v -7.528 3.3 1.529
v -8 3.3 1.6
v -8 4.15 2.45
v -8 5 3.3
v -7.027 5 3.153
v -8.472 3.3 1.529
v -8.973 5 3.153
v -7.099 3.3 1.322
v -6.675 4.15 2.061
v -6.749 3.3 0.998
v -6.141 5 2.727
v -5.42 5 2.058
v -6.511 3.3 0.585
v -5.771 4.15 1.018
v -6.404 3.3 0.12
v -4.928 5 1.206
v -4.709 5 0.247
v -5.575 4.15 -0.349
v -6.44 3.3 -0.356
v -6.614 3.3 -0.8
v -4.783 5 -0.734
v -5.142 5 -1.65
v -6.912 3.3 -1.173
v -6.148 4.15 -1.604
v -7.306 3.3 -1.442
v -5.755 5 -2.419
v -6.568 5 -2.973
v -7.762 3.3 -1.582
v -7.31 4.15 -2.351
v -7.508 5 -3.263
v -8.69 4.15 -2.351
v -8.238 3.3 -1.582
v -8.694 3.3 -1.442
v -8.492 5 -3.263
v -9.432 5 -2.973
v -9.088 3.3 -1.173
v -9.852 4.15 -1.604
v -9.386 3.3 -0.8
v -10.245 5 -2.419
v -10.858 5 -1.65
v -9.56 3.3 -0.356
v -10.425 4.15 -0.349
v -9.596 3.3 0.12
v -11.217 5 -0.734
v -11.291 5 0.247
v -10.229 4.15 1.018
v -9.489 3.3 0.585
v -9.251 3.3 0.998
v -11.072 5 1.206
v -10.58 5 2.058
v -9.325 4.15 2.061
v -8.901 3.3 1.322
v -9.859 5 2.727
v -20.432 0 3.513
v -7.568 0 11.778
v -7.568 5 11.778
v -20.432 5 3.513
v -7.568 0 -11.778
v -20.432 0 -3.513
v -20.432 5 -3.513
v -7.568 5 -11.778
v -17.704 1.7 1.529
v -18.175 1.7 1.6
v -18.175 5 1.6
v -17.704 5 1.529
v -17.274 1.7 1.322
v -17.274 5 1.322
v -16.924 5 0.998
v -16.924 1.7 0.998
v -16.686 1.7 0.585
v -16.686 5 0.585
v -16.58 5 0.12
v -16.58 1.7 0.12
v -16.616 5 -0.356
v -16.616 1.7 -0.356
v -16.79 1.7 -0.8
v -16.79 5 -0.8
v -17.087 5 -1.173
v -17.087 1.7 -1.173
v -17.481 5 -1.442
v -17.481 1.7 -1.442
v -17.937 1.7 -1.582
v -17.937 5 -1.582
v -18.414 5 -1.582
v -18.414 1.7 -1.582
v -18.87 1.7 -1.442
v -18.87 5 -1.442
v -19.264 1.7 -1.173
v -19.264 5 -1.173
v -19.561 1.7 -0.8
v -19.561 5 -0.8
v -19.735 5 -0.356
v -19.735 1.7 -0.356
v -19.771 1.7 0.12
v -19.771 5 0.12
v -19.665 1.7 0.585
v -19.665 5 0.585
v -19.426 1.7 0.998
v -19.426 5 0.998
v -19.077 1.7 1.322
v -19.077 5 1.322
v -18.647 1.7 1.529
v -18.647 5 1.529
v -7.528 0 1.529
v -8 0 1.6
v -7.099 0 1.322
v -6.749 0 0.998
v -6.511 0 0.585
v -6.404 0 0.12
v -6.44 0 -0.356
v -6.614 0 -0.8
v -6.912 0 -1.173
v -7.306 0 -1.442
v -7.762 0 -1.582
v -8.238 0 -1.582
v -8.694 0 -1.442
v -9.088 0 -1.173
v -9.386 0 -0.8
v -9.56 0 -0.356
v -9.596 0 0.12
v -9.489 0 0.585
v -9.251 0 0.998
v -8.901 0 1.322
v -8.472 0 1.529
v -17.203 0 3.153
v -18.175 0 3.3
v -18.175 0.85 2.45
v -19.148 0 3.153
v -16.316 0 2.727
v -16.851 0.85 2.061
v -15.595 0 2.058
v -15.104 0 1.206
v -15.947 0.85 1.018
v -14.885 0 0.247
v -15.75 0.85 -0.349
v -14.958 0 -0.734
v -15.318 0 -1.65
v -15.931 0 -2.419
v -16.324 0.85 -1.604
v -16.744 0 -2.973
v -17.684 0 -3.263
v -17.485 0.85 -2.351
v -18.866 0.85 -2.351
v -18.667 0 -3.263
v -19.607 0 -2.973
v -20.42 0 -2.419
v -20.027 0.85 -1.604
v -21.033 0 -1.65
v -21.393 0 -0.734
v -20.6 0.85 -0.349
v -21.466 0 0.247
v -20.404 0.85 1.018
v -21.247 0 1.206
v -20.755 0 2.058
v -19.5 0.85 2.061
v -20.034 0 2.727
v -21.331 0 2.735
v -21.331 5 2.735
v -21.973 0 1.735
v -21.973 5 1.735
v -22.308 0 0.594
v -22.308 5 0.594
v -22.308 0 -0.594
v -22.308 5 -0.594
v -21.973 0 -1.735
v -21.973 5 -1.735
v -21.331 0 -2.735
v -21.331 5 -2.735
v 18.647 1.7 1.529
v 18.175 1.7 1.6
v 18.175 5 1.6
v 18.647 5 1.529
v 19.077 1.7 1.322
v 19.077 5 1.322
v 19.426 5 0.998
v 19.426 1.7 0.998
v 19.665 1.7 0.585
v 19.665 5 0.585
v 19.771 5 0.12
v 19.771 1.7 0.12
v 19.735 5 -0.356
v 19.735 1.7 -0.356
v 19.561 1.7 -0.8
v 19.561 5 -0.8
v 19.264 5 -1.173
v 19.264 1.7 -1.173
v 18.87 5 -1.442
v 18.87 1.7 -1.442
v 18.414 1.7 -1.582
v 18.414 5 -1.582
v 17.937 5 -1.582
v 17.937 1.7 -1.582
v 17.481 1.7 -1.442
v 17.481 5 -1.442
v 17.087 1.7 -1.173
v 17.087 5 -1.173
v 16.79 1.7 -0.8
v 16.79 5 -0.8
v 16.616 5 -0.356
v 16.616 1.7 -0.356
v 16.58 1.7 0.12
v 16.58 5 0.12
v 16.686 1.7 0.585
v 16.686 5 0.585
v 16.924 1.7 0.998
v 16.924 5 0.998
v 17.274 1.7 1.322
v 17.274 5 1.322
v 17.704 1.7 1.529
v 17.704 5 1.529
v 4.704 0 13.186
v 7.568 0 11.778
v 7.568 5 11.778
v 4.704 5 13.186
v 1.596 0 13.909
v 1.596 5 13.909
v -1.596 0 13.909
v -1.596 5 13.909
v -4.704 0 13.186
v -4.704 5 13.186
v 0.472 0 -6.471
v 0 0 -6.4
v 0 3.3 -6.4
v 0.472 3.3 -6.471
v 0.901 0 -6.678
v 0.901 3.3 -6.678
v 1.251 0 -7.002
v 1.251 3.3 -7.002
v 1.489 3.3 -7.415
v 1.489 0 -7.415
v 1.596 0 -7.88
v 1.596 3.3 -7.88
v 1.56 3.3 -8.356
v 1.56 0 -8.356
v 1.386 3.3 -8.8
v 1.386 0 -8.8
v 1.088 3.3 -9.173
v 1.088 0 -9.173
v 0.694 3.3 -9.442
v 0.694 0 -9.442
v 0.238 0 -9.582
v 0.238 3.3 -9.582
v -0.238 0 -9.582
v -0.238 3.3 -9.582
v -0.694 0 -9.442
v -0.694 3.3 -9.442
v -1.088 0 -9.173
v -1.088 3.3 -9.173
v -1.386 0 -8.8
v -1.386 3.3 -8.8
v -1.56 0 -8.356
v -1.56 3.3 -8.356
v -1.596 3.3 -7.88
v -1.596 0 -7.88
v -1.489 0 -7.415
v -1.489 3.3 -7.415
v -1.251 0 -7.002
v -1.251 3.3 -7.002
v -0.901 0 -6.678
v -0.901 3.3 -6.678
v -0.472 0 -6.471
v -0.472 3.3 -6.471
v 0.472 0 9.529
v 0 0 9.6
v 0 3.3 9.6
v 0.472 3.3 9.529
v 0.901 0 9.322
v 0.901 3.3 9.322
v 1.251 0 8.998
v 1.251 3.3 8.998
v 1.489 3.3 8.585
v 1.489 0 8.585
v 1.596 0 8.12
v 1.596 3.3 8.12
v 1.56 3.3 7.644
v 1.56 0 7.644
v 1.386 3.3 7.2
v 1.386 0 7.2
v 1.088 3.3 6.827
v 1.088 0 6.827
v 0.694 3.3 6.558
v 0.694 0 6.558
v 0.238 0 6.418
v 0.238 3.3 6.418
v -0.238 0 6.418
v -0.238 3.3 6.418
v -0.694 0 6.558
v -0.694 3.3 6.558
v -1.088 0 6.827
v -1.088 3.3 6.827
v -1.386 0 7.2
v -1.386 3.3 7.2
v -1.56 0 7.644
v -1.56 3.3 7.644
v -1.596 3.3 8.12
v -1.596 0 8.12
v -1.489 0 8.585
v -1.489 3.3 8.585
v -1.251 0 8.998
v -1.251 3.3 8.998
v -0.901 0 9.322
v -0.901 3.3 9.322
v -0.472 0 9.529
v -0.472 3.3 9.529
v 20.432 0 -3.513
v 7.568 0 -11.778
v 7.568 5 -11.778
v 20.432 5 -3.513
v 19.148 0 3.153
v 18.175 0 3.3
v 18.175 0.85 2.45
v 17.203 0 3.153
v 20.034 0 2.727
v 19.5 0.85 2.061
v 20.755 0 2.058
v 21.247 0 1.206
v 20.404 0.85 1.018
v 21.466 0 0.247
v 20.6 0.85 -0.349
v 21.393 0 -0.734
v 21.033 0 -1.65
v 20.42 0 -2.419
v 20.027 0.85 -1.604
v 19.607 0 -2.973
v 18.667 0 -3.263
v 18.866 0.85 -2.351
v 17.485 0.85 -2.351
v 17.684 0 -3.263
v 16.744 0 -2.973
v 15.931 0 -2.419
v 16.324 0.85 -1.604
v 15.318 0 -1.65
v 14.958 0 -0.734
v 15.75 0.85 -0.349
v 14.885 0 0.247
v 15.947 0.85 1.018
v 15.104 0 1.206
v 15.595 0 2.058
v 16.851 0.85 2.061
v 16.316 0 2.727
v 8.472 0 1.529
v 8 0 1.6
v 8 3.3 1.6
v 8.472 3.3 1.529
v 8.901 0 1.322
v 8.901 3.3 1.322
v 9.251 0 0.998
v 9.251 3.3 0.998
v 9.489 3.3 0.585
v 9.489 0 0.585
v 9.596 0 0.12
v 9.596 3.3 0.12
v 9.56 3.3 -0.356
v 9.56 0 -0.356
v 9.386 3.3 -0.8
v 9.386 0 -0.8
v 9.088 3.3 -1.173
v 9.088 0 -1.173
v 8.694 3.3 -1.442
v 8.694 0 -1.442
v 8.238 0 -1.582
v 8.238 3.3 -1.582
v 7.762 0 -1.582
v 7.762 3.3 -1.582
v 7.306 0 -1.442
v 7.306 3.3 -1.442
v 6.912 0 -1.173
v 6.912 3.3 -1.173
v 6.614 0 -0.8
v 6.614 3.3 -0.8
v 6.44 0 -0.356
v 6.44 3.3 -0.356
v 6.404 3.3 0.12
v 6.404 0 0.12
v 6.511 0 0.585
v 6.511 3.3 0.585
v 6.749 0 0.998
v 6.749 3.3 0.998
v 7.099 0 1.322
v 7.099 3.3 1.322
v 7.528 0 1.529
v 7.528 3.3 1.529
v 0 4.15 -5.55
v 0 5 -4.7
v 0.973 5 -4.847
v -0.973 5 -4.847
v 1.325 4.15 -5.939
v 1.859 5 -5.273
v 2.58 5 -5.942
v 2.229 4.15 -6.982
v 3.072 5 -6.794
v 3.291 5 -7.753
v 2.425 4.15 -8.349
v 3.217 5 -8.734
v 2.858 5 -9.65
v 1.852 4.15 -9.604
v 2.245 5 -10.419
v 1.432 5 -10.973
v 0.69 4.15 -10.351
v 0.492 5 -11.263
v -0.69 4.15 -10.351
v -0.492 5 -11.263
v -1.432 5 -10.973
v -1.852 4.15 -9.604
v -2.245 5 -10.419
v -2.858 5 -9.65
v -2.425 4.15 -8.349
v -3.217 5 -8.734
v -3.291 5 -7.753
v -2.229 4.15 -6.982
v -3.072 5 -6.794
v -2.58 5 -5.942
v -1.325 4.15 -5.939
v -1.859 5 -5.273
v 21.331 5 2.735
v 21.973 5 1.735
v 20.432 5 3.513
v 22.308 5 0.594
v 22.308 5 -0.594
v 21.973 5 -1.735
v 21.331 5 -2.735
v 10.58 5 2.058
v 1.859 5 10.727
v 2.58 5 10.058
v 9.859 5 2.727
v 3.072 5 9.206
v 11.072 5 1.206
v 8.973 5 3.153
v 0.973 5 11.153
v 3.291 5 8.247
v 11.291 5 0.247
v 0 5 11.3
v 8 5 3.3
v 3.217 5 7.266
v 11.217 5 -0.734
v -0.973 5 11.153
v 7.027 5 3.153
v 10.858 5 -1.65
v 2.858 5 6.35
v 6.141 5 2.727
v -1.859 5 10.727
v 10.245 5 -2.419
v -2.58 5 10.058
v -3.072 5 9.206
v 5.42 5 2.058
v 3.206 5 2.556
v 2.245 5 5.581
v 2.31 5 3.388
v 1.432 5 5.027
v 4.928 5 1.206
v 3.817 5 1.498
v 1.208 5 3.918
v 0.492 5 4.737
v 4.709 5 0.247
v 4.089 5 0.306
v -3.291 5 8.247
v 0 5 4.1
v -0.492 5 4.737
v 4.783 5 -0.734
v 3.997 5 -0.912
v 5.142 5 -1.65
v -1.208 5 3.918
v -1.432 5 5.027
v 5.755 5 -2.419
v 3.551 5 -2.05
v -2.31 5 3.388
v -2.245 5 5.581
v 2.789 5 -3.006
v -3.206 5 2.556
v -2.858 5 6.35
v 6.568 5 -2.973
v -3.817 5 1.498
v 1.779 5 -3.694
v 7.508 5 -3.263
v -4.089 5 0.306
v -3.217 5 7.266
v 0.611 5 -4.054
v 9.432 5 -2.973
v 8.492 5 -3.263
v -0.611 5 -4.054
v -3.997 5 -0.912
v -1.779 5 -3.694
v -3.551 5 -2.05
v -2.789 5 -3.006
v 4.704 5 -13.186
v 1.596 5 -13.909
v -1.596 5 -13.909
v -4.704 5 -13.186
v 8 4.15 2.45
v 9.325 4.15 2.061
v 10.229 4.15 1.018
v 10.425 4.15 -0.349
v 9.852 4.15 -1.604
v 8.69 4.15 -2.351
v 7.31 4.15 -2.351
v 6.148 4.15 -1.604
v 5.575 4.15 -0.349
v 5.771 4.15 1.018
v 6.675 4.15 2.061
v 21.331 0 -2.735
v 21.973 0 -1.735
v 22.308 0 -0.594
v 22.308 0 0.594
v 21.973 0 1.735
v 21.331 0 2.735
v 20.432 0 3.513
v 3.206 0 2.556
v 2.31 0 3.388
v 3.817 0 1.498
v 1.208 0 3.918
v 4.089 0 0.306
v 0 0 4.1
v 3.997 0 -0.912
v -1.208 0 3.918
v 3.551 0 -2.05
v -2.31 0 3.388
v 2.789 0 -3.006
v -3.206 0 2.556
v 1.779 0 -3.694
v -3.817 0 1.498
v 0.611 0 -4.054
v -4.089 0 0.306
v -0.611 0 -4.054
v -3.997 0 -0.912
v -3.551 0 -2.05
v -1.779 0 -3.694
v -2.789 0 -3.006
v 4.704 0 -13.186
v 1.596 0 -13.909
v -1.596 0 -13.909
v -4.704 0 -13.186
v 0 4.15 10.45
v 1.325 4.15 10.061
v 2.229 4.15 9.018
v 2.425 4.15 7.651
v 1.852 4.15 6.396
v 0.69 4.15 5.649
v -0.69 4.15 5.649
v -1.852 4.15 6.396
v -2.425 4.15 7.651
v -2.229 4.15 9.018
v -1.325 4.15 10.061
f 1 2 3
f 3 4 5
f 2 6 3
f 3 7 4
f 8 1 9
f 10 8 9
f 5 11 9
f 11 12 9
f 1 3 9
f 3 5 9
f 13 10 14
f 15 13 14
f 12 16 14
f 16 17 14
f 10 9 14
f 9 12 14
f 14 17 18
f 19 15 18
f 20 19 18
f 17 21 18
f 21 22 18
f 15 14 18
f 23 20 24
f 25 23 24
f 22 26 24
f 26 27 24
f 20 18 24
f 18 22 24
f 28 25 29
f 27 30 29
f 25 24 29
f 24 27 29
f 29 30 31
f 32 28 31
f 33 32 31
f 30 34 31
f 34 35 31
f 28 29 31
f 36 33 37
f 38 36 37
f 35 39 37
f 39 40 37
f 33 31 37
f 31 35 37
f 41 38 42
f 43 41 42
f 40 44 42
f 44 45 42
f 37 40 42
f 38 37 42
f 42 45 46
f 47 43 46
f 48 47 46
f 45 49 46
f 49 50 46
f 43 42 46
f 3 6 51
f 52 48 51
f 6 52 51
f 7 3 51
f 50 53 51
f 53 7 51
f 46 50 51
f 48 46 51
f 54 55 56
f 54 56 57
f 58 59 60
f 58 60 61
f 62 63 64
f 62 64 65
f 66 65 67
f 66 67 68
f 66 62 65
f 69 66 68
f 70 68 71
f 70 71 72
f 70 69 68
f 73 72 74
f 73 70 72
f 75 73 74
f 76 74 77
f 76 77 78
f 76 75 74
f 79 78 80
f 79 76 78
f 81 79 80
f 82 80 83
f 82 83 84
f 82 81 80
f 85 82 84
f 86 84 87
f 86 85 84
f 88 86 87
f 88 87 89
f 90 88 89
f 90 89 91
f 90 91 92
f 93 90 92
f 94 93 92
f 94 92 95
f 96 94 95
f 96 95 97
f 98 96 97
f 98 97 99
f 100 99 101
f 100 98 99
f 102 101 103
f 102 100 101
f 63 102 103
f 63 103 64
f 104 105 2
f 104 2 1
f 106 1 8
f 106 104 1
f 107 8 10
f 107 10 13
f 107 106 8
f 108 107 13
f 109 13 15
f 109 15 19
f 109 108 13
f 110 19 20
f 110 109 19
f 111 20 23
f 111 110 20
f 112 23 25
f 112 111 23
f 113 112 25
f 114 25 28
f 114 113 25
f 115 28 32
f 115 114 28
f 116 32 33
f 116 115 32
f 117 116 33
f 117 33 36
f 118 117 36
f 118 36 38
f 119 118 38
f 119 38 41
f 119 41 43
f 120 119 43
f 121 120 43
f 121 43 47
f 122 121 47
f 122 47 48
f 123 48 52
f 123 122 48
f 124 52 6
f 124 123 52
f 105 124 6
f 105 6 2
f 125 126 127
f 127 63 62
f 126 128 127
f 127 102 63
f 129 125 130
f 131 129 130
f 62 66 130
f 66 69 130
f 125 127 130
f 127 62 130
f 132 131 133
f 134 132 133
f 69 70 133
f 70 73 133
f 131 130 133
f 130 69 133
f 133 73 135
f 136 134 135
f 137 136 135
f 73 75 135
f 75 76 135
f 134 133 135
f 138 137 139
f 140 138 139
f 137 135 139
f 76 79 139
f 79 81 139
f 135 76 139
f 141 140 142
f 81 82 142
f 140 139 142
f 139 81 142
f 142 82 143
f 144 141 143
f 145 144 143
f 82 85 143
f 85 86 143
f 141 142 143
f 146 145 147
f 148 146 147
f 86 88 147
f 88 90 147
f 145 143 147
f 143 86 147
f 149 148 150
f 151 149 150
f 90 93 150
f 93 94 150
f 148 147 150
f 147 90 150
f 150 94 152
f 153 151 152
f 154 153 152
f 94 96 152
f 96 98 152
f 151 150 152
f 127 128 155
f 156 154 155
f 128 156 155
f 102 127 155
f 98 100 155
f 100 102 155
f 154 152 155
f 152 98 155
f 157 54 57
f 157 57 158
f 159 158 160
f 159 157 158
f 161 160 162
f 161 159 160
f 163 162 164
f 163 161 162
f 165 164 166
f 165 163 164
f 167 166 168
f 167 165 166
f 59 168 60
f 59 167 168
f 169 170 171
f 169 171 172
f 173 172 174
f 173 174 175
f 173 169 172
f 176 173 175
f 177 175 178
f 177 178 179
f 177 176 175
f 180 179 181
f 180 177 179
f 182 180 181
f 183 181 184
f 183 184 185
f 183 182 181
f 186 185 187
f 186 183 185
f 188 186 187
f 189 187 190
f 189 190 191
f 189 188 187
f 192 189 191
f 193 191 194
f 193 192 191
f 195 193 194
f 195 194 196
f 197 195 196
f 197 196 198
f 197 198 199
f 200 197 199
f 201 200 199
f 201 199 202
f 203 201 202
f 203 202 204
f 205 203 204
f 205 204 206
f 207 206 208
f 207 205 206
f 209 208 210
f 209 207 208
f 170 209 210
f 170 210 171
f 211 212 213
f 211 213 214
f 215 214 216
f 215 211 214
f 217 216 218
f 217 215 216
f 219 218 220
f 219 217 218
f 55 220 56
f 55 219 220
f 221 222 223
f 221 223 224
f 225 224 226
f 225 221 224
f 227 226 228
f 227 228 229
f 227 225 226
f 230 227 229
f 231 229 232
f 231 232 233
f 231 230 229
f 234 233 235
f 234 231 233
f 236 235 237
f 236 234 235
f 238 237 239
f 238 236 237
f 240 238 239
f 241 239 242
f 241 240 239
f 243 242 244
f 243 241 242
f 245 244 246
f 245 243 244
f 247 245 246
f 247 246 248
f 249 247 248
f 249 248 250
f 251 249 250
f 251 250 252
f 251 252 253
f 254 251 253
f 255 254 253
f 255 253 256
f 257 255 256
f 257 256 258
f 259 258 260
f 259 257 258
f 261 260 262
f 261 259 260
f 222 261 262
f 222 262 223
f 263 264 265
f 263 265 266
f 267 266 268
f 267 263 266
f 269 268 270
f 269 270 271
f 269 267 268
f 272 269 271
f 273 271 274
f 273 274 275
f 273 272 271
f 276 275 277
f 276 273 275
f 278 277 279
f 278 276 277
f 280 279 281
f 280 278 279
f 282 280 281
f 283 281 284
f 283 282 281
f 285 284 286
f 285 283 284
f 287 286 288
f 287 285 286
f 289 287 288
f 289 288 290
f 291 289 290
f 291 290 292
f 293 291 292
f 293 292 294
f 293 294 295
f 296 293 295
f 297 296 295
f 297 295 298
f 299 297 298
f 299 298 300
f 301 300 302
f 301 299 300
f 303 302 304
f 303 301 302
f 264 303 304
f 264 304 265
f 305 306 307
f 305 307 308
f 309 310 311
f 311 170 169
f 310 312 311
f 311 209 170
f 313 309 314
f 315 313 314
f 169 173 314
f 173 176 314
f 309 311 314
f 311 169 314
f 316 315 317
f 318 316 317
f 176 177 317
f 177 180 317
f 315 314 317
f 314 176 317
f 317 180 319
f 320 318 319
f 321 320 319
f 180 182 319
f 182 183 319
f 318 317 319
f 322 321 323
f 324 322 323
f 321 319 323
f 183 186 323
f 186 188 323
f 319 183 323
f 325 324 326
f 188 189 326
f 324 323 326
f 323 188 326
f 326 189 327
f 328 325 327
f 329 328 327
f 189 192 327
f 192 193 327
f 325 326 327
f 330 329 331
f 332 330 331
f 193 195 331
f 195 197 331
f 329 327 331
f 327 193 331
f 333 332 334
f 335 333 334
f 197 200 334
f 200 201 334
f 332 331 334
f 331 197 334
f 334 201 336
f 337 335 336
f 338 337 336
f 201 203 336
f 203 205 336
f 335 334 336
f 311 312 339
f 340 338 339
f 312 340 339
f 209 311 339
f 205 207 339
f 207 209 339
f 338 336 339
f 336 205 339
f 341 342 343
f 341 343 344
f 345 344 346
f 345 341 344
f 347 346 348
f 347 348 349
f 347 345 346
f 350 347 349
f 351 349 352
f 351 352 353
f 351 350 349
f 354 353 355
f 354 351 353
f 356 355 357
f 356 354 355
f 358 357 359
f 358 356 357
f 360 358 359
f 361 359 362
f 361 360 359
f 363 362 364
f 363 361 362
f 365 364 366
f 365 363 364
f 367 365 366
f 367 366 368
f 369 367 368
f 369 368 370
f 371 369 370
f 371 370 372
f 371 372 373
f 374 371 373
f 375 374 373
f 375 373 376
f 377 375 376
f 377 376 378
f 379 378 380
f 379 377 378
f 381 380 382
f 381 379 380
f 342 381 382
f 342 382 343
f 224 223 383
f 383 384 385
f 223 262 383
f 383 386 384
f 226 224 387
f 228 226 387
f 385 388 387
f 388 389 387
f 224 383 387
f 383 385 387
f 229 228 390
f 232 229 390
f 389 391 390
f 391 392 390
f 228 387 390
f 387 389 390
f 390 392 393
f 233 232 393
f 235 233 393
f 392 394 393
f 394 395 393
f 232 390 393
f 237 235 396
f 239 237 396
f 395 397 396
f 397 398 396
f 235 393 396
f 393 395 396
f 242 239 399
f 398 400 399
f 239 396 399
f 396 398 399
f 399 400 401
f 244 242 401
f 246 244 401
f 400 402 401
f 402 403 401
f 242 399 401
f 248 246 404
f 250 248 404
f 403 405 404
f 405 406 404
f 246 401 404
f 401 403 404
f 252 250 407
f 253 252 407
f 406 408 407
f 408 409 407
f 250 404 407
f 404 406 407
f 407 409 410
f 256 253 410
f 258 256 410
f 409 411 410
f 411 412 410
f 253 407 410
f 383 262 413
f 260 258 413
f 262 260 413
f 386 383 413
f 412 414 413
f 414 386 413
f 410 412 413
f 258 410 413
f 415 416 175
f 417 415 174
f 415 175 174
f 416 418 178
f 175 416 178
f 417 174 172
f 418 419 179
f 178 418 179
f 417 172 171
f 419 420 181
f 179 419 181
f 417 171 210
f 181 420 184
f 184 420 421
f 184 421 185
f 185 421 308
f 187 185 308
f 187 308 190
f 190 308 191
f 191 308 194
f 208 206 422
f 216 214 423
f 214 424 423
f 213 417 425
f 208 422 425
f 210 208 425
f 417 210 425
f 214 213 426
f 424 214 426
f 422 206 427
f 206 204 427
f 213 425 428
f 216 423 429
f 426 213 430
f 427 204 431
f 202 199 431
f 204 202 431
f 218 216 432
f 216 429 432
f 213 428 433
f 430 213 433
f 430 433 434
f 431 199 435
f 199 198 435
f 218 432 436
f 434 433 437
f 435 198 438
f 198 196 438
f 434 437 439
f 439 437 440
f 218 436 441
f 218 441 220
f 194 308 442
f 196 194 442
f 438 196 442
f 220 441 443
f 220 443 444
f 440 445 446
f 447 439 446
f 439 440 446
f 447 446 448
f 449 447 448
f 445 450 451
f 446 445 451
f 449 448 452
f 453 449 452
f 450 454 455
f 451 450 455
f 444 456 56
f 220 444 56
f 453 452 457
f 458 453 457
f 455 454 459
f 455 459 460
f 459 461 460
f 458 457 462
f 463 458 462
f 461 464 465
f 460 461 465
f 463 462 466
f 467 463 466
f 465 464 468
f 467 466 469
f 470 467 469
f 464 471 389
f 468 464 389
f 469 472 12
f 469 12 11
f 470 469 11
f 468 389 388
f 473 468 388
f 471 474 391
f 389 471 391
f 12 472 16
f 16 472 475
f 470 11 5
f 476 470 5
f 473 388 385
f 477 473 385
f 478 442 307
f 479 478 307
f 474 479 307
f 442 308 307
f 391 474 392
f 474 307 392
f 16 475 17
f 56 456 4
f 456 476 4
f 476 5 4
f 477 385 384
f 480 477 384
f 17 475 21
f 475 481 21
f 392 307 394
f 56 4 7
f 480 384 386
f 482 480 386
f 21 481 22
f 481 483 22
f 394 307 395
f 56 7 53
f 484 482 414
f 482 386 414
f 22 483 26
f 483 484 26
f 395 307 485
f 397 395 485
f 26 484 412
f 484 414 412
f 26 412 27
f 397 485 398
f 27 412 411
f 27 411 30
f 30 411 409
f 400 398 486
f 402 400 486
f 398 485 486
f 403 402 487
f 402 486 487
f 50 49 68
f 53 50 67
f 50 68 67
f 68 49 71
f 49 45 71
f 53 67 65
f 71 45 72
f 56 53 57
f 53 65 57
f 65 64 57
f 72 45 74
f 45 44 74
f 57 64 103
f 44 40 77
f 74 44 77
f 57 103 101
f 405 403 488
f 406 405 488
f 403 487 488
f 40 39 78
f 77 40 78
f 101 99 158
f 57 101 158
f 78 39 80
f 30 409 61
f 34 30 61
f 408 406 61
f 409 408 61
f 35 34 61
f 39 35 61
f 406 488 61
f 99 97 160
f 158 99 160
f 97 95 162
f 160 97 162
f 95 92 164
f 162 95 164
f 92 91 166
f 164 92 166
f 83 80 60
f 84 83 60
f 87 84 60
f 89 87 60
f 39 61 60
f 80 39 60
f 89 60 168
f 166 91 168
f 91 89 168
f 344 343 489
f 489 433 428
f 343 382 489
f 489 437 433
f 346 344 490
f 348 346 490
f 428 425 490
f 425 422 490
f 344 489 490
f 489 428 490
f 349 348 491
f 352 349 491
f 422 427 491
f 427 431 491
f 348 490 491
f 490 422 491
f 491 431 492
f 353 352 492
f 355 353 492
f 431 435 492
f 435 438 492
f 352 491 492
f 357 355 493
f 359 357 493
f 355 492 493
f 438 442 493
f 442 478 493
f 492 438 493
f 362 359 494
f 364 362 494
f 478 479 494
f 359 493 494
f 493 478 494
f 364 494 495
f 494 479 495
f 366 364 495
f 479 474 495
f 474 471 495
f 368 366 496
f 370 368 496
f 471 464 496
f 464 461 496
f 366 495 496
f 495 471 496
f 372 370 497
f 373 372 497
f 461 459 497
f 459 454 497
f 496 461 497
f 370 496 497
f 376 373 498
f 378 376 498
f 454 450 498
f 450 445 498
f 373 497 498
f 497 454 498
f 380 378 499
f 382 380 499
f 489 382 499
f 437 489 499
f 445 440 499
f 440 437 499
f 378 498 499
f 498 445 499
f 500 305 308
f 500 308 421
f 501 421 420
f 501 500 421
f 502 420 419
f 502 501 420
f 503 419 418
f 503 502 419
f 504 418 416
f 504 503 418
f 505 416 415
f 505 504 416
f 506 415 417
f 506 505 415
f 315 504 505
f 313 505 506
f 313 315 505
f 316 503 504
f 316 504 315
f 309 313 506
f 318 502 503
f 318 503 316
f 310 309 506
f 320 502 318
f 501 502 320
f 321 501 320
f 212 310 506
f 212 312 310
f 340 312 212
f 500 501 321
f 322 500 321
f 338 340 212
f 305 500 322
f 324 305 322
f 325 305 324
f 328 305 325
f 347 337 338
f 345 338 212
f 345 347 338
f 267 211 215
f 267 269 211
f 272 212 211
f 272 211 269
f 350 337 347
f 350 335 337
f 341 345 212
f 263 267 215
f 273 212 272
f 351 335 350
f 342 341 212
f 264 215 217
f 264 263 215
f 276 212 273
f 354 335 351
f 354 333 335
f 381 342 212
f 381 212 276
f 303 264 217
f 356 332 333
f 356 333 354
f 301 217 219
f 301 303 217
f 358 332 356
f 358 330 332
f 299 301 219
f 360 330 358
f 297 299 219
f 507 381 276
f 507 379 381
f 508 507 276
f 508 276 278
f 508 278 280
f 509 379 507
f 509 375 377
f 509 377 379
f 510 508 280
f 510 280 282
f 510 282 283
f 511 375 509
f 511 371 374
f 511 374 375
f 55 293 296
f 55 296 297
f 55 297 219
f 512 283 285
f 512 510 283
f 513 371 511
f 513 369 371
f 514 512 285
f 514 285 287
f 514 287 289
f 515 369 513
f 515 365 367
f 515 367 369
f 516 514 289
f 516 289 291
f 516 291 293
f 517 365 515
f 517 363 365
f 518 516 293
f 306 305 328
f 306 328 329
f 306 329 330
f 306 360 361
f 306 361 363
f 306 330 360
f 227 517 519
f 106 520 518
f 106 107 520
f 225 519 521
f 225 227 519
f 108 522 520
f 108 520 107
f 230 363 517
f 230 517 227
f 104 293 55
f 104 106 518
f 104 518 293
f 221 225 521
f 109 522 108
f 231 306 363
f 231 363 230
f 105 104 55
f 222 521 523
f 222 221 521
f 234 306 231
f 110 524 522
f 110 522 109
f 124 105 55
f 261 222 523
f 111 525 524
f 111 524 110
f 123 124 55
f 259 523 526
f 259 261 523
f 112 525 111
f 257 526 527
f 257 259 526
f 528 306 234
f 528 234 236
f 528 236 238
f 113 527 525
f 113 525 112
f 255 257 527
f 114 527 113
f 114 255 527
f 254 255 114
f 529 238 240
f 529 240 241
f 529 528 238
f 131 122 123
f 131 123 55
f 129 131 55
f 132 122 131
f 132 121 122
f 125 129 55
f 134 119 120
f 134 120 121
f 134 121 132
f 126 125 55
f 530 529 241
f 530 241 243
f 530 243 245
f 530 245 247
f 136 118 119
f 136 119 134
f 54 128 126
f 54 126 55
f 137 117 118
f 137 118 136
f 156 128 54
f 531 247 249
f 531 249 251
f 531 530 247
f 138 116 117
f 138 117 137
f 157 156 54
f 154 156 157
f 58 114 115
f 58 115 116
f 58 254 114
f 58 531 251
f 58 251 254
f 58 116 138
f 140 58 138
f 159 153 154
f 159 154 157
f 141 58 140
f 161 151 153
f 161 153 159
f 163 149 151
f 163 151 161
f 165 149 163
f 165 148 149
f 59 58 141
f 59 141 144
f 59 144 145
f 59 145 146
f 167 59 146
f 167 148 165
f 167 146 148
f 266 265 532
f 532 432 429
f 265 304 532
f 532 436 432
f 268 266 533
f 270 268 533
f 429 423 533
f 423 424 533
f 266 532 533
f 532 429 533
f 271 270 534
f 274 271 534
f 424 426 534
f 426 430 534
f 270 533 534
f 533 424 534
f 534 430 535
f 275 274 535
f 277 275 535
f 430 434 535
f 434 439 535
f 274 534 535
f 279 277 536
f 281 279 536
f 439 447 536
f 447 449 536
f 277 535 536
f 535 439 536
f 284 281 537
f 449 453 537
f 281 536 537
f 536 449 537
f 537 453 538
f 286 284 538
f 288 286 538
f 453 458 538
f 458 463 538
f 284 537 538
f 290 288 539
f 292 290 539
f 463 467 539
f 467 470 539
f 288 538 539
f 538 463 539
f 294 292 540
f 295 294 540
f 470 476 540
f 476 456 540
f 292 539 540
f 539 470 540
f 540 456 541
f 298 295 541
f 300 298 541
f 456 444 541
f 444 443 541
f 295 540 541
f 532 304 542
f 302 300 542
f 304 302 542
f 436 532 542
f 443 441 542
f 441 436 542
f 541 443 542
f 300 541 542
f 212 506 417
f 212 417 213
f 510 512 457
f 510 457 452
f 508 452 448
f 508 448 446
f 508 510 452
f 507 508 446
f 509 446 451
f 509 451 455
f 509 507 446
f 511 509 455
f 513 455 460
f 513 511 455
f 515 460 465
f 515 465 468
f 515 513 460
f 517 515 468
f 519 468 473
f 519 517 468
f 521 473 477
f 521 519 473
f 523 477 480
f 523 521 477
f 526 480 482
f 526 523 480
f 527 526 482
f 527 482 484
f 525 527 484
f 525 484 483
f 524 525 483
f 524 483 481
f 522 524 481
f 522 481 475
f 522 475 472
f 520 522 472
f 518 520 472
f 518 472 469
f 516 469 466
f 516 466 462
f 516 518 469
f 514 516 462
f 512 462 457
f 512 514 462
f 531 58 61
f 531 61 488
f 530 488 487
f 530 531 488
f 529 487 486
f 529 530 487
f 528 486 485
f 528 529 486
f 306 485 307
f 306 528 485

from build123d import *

# Parameters (mm, degrees)
SKETCH1_R           = 4.1
SKETCH1_R_2         = 1.6
BOSS_EXTRUDE1_DEPTH = 5
CHAMFER1_SIZE       = 1.7
CHAMFER2_SIZE       = 1.7


with BuildPart() as part:
    # Sketch1 → Boss-Extrude1 (new body)
    with BuildSketch(Plane(origin=(0, 0, 0), x_dir=(1, 0, 0), z_dir=(0, 1, 0))):
        with BuildLine():
            Line((-20.432418055, 3.512858569), (-7.567581945, 11.778442321))
            ThreePointArc((-7.567581945, 11.778442321), (0, 14), (7.567581945, 11.778442321))
            Line((7.567581945, 11.778442321), (20.432418055, 3.512858569))
            ThreePointArc((20.432418055, 3.512858569), (22.350852961, 0), (20.432418055, -3.512858569))
            Line((20.432418055, -3.512858569), (7.567581945, -11.778442321))
            ThreePointArc((7.567581945, -11.778442321), (0, -14), (-7.567581945, -11.778442321))
            Line((-7.567581945, -11.778442321), (-20.432418055, -3.512858569))
            ThreePointArc((-20.432418055, -3.512858569), (-22.350852961, 0), (-20.432418055, 3.512858569))
        make_face()
        with Locations(Location((0, 0, 0), (0, 0, 270))):
            Circle(SKETCH1_R, mode=Mode.SUBTRACT)
        with Locations(Location((-18.175426481, 0, 0), (0, 0, 270))):
            Circle(SKETCH1_R_2, mode=Mode.SUBTRACT)
        with Locations(Location((18.175426481, 0, 0), (0, 0, 270))):
            Circle(SKETCH1_R_2, mode=Mode.SUBTRACT)
        with Locations(Location((8, 0, 0), (0, 0, 270))):
            Circle(SKETCH1_R_2, mode=Mode.SUBTRACT)
        with Locations(Location((0, 8, 0), (0, 0, 270))):
            Circle(SKETCH1_R_2, mode=Mode.SUBTRACT)
        with Locations(Location((-8, 0, 0), (0, 0, 270))):
            Circle(SKETCH1_R_2, mode=Mode.SUBTRACT)
        with Locations(Location((0, -8, 0), (0, 0, 270))):
            Circle(SKETCH1_R_2, mode=Mode.SUBTRACT)
    extrude(amount=BOSS_EXTRUDE1_DEPTH)

    # Chamfer1
    chamfer1_edges = [part.edges().sort_by_distance(p)[0] for p in [
        (0, 5, -9.6),
        (8, 5, -1.6),
        (-8, 5, -1.6),
        (0, 5, 6.4),
    ]]
    chamfer(chamfer1_edges, length=CHAMFER1_SIZE)

    # Chamfer2
    chamfer2_edges = [part.edges().sort_by_distance(p)[0] for p in [
        (-18.175426481, 0, -1.6),
        (18.175426481, 0, -1.6),
    ]]
    chamfer(chamfer2_edges, length=CHAMFER2_SIZE)


solid = part.part
